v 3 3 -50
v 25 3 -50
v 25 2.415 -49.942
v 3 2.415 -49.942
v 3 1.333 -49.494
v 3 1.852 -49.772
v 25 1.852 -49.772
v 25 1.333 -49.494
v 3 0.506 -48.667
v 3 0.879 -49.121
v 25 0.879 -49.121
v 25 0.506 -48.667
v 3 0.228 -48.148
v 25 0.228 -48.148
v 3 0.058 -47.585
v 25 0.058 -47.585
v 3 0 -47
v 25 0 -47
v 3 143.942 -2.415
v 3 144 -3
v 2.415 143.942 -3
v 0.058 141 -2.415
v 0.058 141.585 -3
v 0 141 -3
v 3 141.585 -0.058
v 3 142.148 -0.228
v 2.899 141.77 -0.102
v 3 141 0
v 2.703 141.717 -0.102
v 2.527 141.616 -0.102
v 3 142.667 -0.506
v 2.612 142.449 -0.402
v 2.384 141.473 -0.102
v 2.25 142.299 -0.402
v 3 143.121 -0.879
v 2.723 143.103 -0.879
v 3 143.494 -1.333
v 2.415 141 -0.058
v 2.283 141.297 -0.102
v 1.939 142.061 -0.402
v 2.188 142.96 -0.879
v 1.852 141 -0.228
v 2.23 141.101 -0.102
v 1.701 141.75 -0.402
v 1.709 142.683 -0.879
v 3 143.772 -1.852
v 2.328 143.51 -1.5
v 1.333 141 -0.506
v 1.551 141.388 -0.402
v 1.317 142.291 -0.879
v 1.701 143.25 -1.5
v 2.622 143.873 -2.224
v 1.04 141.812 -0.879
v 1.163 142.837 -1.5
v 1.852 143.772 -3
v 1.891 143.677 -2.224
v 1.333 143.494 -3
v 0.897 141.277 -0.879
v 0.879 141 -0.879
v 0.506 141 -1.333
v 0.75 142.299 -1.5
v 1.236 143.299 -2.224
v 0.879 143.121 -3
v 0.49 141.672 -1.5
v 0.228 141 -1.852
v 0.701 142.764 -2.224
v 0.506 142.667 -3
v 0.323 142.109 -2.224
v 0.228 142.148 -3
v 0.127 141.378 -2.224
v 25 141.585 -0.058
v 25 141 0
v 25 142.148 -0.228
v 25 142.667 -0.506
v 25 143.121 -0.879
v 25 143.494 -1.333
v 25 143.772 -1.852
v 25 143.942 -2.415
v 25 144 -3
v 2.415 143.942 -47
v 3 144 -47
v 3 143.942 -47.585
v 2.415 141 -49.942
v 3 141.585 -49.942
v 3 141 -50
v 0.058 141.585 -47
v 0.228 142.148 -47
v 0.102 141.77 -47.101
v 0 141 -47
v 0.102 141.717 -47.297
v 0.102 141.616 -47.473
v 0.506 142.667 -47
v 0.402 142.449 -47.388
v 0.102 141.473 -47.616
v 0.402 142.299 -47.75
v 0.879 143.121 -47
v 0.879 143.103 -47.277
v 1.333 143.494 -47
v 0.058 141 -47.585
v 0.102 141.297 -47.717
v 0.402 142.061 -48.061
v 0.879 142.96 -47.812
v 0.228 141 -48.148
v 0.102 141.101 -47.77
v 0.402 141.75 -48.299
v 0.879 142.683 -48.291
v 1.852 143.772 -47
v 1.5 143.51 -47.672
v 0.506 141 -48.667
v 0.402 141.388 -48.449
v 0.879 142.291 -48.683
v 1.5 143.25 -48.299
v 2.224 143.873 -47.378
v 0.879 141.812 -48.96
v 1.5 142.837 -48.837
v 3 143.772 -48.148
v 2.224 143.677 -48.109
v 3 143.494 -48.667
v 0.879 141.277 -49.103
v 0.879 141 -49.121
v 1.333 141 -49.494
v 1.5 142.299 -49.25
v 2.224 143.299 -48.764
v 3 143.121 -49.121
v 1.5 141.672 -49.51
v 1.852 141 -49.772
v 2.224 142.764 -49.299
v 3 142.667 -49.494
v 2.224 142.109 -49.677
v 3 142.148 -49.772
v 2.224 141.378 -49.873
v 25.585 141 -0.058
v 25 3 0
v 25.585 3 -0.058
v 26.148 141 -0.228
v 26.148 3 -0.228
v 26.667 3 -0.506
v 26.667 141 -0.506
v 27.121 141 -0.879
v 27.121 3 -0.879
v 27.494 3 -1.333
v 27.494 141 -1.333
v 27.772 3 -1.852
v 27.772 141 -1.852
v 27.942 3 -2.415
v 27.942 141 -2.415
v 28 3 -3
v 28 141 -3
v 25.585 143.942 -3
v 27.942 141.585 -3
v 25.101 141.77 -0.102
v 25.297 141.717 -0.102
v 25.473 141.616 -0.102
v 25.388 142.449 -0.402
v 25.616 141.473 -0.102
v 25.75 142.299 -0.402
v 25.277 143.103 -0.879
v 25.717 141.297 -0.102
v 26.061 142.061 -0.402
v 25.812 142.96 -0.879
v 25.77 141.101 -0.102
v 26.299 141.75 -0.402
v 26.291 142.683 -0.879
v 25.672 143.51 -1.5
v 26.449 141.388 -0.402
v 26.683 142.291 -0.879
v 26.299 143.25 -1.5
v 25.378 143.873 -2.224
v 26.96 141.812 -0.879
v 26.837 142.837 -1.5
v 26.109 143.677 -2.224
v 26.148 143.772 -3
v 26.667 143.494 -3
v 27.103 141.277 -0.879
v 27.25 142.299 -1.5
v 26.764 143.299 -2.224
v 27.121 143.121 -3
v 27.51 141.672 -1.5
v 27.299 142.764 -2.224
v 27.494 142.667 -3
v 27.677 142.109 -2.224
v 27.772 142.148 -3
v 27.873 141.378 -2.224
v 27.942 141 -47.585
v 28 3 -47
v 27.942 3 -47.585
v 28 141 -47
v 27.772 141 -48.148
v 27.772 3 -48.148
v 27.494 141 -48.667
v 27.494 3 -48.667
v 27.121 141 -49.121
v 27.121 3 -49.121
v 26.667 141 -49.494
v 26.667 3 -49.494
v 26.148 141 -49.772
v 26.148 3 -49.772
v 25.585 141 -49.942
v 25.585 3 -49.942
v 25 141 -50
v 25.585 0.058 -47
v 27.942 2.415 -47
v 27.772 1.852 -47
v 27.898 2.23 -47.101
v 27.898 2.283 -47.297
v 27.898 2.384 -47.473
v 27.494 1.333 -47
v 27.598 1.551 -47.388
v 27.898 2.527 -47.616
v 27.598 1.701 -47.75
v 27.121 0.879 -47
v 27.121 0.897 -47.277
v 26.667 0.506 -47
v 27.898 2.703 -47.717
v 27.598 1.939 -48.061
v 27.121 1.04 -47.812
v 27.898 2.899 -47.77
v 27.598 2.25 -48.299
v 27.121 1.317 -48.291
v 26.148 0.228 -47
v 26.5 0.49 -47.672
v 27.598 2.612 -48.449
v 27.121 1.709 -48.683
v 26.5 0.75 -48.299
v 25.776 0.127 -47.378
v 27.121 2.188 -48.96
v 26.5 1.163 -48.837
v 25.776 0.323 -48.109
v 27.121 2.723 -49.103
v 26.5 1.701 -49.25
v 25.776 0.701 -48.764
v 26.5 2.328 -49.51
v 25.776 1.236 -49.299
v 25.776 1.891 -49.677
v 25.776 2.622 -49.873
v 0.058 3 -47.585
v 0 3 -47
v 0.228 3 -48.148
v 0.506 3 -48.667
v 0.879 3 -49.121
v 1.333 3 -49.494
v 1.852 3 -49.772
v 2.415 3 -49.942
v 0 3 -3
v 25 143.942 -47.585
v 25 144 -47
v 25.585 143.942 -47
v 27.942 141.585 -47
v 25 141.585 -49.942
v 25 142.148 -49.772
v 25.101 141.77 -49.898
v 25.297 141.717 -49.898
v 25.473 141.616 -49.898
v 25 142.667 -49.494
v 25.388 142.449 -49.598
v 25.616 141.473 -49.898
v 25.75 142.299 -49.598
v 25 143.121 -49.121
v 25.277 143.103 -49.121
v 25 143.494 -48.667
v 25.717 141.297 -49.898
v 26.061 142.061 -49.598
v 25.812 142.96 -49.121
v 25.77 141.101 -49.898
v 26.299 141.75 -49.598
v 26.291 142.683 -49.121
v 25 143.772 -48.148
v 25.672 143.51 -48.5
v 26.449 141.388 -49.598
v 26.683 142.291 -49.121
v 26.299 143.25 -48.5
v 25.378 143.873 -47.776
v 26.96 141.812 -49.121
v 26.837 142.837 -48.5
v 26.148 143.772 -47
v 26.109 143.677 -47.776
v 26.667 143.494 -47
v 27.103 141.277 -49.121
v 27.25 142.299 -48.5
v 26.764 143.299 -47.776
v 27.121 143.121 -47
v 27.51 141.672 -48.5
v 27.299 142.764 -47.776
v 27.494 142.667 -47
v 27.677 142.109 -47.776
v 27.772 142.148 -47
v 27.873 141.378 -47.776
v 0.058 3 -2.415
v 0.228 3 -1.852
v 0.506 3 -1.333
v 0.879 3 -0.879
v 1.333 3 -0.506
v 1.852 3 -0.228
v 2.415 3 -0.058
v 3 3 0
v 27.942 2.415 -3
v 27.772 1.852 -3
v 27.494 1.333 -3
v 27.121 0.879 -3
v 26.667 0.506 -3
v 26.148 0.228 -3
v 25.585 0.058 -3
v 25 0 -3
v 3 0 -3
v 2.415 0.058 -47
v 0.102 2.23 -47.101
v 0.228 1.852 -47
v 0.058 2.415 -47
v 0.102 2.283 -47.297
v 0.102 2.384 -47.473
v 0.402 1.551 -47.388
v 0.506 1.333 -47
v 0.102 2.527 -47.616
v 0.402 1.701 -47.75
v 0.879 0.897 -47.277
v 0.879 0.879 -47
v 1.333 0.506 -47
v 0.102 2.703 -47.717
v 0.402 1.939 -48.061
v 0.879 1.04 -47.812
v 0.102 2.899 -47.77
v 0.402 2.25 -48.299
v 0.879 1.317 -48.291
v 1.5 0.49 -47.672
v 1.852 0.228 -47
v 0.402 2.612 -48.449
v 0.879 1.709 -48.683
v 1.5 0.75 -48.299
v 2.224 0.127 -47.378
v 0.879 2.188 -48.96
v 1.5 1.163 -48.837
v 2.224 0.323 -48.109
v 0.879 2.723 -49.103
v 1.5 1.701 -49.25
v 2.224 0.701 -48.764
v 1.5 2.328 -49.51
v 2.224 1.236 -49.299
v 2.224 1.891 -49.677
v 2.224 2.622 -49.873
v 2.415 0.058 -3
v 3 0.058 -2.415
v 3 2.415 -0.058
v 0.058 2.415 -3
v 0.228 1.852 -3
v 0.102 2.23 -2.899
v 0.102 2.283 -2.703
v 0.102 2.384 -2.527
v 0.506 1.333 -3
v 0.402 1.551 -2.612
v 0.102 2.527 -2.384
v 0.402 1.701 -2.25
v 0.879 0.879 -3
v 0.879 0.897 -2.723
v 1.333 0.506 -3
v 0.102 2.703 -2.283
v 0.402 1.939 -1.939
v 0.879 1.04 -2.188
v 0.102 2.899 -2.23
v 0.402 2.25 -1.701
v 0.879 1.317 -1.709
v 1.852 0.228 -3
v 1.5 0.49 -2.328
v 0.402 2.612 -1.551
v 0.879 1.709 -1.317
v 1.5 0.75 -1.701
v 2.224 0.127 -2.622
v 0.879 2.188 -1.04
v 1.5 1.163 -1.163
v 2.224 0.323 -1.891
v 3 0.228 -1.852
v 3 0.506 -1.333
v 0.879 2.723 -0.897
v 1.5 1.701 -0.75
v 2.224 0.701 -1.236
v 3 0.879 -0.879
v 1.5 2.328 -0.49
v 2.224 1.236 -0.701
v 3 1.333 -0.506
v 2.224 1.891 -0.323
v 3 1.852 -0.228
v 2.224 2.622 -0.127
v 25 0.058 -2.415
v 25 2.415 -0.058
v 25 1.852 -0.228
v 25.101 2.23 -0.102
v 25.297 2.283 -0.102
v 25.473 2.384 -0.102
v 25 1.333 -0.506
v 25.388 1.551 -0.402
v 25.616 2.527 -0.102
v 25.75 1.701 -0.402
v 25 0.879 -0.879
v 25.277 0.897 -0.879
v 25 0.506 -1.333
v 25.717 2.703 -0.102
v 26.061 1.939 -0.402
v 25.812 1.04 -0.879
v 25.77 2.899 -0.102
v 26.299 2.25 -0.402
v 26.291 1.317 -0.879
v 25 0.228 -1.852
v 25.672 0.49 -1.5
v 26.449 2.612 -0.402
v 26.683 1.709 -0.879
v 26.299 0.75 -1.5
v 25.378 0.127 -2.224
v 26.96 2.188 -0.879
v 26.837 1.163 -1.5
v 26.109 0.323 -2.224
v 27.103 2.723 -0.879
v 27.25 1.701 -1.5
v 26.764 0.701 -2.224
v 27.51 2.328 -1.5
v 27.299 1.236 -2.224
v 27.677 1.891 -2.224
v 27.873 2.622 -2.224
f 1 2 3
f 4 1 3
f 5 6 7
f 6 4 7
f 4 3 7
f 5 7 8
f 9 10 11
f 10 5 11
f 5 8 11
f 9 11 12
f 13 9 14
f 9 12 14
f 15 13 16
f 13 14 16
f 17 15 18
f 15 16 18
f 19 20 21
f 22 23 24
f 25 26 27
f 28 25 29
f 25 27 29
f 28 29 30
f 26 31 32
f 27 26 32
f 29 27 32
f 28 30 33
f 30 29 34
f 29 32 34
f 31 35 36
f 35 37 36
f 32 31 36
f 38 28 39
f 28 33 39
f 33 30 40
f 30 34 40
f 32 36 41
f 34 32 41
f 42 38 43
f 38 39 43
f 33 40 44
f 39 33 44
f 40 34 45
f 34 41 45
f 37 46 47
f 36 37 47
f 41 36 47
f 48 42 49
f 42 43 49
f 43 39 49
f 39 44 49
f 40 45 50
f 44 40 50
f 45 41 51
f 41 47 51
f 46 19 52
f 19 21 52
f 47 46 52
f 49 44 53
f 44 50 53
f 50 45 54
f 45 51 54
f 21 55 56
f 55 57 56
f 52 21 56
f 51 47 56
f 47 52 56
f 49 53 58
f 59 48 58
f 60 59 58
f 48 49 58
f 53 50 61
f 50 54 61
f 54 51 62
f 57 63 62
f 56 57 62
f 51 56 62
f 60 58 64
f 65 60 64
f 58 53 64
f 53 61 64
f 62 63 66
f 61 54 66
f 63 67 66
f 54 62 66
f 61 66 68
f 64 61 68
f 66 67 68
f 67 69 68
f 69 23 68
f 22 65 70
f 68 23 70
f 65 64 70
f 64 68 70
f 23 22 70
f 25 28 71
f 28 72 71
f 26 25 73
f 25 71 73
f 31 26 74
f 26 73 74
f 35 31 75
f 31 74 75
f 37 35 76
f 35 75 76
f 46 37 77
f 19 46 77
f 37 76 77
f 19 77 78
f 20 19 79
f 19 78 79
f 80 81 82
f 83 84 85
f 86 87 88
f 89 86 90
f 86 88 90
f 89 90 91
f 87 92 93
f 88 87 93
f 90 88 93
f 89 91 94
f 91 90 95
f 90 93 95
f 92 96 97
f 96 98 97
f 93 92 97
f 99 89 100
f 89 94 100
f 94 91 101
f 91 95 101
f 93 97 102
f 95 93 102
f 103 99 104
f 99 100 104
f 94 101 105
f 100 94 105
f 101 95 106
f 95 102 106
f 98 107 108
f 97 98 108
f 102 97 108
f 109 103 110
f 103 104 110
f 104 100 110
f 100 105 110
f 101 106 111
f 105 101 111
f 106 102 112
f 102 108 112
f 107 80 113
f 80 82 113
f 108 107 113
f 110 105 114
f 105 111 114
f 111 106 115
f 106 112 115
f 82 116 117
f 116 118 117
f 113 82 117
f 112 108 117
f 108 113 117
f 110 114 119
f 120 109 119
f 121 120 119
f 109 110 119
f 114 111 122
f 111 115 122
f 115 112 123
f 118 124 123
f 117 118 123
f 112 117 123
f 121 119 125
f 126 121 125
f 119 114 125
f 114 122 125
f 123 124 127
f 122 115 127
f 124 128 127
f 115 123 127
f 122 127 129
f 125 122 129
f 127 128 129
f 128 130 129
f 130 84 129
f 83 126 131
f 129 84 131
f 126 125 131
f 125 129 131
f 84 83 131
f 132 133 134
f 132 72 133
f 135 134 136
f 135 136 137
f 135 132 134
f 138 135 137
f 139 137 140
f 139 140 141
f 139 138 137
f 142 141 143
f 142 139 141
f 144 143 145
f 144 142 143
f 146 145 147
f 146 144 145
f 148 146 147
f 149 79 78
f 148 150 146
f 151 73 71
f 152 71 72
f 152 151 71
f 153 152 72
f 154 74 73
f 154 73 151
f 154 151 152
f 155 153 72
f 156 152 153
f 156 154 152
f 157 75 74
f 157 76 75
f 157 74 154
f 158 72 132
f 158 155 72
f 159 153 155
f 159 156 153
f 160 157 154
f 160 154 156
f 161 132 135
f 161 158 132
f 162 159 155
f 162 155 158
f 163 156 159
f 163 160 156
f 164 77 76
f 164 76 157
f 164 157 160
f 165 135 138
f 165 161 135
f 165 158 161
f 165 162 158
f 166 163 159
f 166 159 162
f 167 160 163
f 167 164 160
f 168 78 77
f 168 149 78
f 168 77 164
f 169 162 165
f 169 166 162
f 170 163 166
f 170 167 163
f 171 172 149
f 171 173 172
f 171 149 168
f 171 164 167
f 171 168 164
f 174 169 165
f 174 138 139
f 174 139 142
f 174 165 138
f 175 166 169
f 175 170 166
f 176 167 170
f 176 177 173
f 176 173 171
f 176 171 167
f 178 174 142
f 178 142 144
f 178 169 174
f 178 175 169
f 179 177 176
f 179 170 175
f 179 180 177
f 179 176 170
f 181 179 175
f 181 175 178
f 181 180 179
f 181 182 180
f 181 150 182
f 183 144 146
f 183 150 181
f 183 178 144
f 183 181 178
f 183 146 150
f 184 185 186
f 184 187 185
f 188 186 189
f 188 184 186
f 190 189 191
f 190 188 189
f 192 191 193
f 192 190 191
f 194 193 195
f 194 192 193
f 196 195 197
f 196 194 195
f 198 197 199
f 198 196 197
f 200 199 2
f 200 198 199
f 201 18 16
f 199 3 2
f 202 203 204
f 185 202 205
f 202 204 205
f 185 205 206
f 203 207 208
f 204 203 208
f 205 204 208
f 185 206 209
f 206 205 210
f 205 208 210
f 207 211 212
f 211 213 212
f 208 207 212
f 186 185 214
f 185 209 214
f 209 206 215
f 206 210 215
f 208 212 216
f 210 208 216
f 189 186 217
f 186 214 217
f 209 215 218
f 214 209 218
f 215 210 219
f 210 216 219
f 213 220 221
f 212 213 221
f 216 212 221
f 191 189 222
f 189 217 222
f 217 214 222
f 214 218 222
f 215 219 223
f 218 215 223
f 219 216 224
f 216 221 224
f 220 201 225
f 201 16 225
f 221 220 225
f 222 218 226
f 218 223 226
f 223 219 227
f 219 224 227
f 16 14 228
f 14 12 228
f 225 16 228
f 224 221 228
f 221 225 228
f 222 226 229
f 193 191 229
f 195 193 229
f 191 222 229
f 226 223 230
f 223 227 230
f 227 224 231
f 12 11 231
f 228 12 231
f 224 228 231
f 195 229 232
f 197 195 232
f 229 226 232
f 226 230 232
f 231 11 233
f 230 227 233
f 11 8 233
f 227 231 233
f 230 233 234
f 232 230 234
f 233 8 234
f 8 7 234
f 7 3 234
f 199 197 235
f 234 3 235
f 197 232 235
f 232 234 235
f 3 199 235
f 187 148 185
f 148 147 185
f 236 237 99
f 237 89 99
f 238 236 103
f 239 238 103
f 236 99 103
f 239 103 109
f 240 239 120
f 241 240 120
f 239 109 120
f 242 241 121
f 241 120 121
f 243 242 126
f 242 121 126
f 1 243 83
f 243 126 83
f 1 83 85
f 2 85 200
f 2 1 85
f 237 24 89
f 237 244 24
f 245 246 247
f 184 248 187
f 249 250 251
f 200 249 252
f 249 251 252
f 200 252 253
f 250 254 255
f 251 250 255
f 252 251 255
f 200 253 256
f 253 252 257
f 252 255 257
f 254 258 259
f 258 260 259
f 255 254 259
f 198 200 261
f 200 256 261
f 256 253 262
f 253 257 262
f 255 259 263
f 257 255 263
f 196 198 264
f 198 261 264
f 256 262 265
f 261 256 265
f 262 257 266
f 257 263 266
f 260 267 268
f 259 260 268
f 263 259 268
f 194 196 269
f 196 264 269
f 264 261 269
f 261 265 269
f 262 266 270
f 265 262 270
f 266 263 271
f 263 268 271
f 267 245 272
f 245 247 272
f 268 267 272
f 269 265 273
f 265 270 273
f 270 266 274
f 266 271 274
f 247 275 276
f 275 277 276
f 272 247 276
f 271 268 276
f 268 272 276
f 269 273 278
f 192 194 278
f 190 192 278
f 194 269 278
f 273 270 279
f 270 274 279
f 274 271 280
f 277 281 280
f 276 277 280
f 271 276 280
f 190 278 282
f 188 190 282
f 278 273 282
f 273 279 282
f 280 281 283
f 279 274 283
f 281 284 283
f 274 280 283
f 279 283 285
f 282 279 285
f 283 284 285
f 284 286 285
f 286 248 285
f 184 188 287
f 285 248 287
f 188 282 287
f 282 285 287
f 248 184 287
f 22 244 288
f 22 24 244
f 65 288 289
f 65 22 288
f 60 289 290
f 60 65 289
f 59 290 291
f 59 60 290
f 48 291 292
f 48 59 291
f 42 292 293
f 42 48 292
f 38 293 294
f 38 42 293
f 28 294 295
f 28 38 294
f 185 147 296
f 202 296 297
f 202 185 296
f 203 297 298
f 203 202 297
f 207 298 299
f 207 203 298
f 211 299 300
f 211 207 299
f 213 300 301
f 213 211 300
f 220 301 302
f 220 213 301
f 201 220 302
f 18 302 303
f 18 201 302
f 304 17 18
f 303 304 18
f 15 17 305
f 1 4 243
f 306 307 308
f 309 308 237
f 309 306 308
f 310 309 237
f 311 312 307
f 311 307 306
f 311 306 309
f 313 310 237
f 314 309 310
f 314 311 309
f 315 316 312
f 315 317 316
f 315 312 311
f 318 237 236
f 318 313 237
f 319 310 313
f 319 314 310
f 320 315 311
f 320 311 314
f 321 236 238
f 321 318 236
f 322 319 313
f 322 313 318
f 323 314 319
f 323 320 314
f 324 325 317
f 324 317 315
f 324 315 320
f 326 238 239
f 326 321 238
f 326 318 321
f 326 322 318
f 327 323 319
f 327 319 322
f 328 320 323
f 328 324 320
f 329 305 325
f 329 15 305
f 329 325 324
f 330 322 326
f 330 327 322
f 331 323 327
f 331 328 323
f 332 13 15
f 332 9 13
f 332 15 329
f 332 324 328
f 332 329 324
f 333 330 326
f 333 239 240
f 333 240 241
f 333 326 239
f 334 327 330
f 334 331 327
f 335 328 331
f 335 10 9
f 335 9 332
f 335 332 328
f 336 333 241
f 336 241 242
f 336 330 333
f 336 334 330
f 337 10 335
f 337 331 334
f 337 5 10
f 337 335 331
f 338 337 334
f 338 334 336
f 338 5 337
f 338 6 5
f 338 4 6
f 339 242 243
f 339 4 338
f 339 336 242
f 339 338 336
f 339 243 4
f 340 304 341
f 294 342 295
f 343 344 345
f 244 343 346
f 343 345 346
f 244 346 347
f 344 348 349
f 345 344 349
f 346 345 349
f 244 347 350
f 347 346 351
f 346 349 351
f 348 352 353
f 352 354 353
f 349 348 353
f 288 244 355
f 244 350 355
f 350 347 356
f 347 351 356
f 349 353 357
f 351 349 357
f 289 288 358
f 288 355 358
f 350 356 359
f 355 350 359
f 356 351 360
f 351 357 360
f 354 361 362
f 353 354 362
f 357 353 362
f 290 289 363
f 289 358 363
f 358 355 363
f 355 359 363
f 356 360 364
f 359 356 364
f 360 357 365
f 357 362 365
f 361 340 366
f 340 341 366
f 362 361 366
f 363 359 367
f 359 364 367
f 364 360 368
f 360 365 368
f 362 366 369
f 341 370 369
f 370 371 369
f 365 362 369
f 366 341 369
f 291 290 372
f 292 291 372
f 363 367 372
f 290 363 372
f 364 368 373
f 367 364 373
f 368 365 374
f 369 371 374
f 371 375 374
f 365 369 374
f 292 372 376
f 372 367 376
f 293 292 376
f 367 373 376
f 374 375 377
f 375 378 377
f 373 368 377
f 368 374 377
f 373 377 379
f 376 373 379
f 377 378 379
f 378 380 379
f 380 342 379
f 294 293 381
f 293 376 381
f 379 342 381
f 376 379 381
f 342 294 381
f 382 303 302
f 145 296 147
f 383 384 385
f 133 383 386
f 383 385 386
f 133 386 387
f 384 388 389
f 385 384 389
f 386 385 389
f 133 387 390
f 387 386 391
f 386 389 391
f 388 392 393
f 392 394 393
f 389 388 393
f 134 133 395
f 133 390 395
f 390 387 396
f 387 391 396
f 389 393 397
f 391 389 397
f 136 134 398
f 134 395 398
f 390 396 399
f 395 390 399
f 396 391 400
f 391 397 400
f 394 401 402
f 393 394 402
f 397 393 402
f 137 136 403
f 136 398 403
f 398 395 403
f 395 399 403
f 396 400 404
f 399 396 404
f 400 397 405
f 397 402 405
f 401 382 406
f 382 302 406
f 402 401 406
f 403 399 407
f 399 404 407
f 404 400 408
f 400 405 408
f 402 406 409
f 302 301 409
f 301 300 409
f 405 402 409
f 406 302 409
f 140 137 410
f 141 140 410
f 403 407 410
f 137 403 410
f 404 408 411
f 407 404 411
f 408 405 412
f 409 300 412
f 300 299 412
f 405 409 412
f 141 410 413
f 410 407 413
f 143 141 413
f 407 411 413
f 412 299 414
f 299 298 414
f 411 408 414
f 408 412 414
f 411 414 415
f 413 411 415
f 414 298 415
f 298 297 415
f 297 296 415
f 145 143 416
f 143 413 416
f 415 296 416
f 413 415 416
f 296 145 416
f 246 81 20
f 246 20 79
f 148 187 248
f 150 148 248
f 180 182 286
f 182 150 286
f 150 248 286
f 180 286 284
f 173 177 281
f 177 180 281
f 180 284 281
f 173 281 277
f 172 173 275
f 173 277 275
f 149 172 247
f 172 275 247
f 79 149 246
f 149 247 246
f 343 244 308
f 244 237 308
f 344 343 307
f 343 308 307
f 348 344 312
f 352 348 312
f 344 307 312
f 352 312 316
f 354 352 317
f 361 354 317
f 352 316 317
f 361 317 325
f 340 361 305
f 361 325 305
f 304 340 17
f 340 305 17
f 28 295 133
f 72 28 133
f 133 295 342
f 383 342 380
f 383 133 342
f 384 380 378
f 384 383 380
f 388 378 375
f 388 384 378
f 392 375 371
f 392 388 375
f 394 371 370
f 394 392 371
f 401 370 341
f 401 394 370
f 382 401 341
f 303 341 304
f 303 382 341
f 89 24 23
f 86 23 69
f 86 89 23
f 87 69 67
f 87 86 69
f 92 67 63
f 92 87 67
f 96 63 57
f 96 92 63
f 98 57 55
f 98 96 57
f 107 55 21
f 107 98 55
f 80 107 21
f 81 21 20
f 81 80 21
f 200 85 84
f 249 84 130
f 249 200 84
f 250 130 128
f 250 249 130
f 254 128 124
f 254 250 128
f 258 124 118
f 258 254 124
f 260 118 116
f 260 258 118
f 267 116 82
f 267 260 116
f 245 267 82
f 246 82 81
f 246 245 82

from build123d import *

# Parameters (mm, degrees)
SKETCH1_W           = 28
SKETCH1_H           = 50
BOSS_EXTRUDE1_DEPTH = 144
FILLET1_R           = 3


with BuildPart() as part:
    # Sketch1 → Boss-Extrude1 (new body)
    with BuildSketch(Plane(origin=(0, 0, 0), x_dir=(1, 0, 0), z_dir=(0, 1, 0))):
        with Locations((14, 25)):
            Rectangle(SKETCH1_W, SKETCH1_H)
    extrude(amount=BOSS_EXTRUDE1_DEPTH)

    # Fillet1
    fillet1_edges = [part.edges().sort_by_distance(p)[0] for p in [
        (28, 144, -25),
        (14, 144, -50),
        (0, 144, -25),
        (14, 0, -50),
        (28, 0, -25),
        (14, 0, 0),
        (0, 0, -25),
        (14, 144, 0),
        (0, 72, -50),
        (28, 72, -50),
        (28, 72, 0),
        (0, 72, 0),
    ]]
    fillet(fillet1_edges, radius=FILLET1_R)


solid = part.part
